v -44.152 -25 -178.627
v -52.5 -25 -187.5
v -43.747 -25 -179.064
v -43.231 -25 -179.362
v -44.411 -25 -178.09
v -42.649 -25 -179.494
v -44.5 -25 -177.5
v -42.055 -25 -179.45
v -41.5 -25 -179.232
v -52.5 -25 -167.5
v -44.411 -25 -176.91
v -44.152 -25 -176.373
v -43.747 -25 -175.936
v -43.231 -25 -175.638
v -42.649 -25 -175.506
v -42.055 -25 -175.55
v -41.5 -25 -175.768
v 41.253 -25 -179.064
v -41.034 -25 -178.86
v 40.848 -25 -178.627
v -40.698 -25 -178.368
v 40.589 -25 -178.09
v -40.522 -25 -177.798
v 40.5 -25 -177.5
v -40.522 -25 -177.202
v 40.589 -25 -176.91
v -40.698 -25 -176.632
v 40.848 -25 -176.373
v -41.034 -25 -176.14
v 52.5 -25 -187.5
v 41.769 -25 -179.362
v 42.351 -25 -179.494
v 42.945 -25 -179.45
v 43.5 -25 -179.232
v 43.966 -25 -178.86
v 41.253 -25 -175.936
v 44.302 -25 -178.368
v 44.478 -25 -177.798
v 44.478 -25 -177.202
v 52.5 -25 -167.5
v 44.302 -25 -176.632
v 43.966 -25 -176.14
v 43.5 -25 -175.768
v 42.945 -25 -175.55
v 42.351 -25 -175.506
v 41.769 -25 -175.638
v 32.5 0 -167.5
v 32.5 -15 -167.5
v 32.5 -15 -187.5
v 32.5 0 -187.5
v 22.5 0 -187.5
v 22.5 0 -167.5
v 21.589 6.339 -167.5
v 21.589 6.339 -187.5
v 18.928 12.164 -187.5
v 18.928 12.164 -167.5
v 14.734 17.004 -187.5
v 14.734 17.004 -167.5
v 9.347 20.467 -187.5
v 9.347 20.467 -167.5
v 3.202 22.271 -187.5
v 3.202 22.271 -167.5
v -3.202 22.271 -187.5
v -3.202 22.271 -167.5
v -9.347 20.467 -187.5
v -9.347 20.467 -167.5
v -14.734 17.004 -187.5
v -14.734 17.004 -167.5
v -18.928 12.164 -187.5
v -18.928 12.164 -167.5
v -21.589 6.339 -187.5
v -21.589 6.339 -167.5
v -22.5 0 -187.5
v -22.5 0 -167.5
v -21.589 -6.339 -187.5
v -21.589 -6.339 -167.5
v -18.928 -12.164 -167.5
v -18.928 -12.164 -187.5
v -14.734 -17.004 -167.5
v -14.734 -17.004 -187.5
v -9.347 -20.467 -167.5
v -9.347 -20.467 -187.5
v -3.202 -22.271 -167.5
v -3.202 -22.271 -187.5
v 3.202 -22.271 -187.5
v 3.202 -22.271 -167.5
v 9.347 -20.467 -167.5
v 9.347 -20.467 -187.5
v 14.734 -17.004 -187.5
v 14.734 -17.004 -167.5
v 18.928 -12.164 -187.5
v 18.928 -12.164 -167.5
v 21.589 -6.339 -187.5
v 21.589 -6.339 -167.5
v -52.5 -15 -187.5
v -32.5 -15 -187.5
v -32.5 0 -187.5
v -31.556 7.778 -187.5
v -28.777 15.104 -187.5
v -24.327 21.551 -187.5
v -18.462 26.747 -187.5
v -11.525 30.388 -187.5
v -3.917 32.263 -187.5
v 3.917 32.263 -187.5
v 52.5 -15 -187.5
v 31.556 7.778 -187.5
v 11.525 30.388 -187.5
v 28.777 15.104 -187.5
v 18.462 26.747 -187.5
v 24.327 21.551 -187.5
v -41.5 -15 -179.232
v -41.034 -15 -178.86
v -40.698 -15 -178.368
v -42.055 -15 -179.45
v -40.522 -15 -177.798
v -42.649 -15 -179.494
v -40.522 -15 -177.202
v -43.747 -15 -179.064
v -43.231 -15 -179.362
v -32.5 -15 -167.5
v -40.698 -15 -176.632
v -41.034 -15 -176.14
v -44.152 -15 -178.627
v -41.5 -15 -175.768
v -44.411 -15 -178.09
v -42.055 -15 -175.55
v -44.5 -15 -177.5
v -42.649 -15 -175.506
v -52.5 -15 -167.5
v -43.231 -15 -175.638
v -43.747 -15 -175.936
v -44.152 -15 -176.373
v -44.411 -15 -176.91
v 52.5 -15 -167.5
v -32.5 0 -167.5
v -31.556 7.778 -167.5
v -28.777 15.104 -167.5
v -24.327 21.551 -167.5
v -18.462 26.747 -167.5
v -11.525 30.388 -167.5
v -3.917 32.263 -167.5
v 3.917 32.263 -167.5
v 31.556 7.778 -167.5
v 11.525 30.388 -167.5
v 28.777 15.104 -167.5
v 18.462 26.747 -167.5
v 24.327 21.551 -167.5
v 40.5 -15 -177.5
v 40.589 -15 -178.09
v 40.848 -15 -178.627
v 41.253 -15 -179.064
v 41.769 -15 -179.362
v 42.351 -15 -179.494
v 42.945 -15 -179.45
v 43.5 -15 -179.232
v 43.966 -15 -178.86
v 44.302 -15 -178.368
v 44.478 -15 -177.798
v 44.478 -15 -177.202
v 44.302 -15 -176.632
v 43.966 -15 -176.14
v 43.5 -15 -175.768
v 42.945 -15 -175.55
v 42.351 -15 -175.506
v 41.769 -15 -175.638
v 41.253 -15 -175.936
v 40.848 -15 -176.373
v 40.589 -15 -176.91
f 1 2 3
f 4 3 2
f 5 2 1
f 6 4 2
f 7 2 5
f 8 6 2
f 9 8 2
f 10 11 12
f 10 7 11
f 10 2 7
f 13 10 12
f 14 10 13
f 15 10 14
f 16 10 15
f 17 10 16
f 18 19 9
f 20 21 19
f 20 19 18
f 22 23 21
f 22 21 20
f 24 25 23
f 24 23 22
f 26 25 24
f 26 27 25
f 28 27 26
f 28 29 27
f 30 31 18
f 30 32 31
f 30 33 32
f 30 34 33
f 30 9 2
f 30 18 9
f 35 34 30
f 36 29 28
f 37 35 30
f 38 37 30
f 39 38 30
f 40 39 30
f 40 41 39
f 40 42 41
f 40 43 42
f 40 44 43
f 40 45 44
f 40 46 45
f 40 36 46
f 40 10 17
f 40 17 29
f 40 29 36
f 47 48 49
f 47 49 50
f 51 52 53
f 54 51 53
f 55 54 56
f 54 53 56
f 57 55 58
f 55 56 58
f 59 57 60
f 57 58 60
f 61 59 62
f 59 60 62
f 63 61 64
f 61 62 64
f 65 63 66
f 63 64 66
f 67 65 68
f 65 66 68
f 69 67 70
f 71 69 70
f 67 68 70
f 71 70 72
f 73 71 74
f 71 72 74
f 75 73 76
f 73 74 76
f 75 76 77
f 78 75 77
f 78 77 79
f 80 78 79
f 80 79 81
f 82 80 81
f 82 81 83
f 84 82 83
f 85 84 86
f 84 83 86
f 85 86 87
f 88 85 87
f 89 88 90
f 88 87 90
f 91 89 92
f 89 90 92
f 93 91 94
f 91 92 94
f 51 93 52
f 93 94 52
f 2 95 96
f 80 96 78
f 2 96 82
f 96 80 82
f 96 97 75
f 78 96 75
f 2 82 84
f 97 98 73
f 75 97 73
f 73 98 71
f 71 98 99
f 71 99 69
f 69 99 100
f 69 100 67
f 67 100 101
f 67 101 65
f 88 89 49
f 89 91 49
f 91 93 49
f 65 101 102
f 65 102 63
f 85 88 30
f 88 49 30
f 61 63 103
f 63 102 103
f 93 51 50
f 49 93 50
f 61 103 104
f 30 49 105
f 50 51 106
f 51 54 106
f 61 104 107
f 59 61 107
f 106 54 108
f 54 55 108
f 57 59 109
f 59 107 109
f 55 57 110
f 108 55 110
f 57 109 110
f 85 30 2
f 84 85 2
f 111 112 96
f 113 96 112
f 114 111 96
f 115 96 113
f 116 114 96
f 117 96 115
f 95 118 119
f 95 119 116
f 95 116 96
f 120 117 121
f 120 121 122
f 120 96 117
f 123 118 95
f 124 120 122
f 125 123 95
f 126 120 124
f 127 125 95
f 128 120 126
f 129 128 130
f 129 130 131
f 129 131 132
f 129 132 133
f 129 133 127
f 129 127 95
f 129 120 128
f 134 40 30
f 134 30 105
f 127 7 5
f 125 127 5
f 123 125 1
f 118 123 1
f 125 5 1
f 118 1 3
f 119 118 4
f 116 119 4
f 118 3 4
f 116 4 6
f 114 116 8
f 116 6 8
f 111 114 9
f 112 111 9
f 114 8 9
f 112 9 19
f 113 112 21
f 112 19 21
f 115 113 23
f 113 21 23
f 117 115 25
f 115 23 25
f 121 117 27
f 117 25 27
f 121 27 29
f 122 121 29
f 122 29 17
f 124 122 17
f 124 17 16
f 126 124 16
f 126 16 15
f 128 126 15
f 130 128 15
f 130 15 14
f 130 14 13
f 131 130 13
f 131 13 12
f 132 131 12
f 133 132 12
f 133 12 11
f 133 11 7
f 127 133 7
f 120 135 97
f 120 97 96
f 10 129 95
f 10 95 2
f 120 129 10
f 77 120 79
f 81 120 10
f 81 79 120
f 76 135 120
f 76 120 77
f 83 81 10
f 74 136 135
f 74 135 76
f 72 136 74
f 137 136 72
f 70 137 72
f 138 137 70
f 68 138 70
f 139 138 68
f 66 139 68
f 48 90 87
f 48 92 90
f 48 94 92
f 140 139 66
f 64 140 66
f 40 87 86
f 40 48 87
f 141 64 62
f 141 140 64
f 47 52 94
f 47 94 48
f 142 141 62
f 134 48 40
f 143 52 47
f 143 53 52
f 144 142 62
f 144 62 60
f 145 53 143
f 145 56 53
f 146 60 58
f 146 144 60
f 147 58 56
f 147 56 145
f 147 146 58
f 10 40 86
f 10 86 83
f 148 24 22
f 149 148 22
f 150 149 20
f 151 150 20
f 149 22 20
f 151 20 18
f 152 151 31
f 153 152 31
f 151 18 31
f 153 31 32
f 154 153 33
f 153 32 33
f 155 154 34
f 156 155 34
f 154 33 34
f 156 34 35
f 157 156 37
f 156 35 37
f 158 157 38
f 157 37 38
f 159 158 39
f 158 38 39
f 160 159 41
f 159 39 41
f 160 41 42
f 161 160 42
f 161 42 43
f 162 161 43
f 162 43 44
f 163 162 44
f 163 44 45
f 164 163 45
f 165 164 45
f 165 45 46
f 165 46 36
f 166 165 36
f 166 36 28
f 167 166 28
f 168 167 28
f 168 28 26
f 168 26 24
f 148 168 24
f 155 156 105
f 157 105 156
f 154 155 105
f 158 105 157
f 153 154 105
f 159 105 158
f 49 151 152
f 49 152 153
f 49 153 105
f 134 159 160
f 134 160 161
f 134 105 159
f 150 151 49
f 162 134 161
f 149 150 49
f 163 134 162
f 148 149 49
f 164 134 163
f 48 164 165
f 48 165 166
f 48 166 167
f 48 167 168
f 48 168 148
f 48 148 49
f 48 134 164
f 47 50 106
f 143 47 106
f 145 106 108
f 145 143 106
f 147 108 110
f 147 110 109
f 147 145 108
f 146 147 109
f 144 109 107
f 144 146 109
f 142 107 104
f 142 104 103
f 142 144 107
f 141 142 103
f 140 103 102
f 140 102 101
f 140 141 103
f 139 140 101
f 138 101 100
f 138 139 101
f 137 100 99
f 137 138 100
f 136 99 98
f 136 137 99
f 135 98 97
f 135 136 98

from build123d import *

# Parameters (mm, degrees)
SKETCH1_R             = 22.5
BOSS_EXTRUDE2_DEPTH   = 20
F_4_0MM_DOWEL_HOLE1_D = 4


with BuildPart() as part:
    # Sketch1 → Boss-Extrude2 (new body)
    with BuildSketch(Plane.XY.offset(-167.5)):
        with BuildLine():
            Line((-32.5, 0), (-32.5, -15))
            Line((-32.5, -15), (-52.5, -15))
            Line((-52.5, -15), (-52.5, -25))
            Line((-52.5, -25), (52.5, -25))
            Line((52.5, -25), (52.5, -15))
            Line((52.5, -15), (32.5, -15))
            Line((32.5, -15), (32.5, 0))
            ThreePointArc((32.5, 0), (0, 32.5), (-32.5, 0))
        make_face()
        Circle(SKETCH1_R, mode=Mode.SUBTRACT)
    extrude(amount=-BOSS_EXTRUDE2_DEPTH)

    # Ø4.0mm Dowel Hole1 (through all)
    with Locations(Plane(origin=(0, -15, 0), x_dir=(1, 0, 0), z_dir=(0, 1, 0))):
        with Locations((42.5, 177.5), (-42.5, 177.5)):
            Hole(F_4_0MM_DOWEL_HOLE1_D / 2)


solid = part.part
